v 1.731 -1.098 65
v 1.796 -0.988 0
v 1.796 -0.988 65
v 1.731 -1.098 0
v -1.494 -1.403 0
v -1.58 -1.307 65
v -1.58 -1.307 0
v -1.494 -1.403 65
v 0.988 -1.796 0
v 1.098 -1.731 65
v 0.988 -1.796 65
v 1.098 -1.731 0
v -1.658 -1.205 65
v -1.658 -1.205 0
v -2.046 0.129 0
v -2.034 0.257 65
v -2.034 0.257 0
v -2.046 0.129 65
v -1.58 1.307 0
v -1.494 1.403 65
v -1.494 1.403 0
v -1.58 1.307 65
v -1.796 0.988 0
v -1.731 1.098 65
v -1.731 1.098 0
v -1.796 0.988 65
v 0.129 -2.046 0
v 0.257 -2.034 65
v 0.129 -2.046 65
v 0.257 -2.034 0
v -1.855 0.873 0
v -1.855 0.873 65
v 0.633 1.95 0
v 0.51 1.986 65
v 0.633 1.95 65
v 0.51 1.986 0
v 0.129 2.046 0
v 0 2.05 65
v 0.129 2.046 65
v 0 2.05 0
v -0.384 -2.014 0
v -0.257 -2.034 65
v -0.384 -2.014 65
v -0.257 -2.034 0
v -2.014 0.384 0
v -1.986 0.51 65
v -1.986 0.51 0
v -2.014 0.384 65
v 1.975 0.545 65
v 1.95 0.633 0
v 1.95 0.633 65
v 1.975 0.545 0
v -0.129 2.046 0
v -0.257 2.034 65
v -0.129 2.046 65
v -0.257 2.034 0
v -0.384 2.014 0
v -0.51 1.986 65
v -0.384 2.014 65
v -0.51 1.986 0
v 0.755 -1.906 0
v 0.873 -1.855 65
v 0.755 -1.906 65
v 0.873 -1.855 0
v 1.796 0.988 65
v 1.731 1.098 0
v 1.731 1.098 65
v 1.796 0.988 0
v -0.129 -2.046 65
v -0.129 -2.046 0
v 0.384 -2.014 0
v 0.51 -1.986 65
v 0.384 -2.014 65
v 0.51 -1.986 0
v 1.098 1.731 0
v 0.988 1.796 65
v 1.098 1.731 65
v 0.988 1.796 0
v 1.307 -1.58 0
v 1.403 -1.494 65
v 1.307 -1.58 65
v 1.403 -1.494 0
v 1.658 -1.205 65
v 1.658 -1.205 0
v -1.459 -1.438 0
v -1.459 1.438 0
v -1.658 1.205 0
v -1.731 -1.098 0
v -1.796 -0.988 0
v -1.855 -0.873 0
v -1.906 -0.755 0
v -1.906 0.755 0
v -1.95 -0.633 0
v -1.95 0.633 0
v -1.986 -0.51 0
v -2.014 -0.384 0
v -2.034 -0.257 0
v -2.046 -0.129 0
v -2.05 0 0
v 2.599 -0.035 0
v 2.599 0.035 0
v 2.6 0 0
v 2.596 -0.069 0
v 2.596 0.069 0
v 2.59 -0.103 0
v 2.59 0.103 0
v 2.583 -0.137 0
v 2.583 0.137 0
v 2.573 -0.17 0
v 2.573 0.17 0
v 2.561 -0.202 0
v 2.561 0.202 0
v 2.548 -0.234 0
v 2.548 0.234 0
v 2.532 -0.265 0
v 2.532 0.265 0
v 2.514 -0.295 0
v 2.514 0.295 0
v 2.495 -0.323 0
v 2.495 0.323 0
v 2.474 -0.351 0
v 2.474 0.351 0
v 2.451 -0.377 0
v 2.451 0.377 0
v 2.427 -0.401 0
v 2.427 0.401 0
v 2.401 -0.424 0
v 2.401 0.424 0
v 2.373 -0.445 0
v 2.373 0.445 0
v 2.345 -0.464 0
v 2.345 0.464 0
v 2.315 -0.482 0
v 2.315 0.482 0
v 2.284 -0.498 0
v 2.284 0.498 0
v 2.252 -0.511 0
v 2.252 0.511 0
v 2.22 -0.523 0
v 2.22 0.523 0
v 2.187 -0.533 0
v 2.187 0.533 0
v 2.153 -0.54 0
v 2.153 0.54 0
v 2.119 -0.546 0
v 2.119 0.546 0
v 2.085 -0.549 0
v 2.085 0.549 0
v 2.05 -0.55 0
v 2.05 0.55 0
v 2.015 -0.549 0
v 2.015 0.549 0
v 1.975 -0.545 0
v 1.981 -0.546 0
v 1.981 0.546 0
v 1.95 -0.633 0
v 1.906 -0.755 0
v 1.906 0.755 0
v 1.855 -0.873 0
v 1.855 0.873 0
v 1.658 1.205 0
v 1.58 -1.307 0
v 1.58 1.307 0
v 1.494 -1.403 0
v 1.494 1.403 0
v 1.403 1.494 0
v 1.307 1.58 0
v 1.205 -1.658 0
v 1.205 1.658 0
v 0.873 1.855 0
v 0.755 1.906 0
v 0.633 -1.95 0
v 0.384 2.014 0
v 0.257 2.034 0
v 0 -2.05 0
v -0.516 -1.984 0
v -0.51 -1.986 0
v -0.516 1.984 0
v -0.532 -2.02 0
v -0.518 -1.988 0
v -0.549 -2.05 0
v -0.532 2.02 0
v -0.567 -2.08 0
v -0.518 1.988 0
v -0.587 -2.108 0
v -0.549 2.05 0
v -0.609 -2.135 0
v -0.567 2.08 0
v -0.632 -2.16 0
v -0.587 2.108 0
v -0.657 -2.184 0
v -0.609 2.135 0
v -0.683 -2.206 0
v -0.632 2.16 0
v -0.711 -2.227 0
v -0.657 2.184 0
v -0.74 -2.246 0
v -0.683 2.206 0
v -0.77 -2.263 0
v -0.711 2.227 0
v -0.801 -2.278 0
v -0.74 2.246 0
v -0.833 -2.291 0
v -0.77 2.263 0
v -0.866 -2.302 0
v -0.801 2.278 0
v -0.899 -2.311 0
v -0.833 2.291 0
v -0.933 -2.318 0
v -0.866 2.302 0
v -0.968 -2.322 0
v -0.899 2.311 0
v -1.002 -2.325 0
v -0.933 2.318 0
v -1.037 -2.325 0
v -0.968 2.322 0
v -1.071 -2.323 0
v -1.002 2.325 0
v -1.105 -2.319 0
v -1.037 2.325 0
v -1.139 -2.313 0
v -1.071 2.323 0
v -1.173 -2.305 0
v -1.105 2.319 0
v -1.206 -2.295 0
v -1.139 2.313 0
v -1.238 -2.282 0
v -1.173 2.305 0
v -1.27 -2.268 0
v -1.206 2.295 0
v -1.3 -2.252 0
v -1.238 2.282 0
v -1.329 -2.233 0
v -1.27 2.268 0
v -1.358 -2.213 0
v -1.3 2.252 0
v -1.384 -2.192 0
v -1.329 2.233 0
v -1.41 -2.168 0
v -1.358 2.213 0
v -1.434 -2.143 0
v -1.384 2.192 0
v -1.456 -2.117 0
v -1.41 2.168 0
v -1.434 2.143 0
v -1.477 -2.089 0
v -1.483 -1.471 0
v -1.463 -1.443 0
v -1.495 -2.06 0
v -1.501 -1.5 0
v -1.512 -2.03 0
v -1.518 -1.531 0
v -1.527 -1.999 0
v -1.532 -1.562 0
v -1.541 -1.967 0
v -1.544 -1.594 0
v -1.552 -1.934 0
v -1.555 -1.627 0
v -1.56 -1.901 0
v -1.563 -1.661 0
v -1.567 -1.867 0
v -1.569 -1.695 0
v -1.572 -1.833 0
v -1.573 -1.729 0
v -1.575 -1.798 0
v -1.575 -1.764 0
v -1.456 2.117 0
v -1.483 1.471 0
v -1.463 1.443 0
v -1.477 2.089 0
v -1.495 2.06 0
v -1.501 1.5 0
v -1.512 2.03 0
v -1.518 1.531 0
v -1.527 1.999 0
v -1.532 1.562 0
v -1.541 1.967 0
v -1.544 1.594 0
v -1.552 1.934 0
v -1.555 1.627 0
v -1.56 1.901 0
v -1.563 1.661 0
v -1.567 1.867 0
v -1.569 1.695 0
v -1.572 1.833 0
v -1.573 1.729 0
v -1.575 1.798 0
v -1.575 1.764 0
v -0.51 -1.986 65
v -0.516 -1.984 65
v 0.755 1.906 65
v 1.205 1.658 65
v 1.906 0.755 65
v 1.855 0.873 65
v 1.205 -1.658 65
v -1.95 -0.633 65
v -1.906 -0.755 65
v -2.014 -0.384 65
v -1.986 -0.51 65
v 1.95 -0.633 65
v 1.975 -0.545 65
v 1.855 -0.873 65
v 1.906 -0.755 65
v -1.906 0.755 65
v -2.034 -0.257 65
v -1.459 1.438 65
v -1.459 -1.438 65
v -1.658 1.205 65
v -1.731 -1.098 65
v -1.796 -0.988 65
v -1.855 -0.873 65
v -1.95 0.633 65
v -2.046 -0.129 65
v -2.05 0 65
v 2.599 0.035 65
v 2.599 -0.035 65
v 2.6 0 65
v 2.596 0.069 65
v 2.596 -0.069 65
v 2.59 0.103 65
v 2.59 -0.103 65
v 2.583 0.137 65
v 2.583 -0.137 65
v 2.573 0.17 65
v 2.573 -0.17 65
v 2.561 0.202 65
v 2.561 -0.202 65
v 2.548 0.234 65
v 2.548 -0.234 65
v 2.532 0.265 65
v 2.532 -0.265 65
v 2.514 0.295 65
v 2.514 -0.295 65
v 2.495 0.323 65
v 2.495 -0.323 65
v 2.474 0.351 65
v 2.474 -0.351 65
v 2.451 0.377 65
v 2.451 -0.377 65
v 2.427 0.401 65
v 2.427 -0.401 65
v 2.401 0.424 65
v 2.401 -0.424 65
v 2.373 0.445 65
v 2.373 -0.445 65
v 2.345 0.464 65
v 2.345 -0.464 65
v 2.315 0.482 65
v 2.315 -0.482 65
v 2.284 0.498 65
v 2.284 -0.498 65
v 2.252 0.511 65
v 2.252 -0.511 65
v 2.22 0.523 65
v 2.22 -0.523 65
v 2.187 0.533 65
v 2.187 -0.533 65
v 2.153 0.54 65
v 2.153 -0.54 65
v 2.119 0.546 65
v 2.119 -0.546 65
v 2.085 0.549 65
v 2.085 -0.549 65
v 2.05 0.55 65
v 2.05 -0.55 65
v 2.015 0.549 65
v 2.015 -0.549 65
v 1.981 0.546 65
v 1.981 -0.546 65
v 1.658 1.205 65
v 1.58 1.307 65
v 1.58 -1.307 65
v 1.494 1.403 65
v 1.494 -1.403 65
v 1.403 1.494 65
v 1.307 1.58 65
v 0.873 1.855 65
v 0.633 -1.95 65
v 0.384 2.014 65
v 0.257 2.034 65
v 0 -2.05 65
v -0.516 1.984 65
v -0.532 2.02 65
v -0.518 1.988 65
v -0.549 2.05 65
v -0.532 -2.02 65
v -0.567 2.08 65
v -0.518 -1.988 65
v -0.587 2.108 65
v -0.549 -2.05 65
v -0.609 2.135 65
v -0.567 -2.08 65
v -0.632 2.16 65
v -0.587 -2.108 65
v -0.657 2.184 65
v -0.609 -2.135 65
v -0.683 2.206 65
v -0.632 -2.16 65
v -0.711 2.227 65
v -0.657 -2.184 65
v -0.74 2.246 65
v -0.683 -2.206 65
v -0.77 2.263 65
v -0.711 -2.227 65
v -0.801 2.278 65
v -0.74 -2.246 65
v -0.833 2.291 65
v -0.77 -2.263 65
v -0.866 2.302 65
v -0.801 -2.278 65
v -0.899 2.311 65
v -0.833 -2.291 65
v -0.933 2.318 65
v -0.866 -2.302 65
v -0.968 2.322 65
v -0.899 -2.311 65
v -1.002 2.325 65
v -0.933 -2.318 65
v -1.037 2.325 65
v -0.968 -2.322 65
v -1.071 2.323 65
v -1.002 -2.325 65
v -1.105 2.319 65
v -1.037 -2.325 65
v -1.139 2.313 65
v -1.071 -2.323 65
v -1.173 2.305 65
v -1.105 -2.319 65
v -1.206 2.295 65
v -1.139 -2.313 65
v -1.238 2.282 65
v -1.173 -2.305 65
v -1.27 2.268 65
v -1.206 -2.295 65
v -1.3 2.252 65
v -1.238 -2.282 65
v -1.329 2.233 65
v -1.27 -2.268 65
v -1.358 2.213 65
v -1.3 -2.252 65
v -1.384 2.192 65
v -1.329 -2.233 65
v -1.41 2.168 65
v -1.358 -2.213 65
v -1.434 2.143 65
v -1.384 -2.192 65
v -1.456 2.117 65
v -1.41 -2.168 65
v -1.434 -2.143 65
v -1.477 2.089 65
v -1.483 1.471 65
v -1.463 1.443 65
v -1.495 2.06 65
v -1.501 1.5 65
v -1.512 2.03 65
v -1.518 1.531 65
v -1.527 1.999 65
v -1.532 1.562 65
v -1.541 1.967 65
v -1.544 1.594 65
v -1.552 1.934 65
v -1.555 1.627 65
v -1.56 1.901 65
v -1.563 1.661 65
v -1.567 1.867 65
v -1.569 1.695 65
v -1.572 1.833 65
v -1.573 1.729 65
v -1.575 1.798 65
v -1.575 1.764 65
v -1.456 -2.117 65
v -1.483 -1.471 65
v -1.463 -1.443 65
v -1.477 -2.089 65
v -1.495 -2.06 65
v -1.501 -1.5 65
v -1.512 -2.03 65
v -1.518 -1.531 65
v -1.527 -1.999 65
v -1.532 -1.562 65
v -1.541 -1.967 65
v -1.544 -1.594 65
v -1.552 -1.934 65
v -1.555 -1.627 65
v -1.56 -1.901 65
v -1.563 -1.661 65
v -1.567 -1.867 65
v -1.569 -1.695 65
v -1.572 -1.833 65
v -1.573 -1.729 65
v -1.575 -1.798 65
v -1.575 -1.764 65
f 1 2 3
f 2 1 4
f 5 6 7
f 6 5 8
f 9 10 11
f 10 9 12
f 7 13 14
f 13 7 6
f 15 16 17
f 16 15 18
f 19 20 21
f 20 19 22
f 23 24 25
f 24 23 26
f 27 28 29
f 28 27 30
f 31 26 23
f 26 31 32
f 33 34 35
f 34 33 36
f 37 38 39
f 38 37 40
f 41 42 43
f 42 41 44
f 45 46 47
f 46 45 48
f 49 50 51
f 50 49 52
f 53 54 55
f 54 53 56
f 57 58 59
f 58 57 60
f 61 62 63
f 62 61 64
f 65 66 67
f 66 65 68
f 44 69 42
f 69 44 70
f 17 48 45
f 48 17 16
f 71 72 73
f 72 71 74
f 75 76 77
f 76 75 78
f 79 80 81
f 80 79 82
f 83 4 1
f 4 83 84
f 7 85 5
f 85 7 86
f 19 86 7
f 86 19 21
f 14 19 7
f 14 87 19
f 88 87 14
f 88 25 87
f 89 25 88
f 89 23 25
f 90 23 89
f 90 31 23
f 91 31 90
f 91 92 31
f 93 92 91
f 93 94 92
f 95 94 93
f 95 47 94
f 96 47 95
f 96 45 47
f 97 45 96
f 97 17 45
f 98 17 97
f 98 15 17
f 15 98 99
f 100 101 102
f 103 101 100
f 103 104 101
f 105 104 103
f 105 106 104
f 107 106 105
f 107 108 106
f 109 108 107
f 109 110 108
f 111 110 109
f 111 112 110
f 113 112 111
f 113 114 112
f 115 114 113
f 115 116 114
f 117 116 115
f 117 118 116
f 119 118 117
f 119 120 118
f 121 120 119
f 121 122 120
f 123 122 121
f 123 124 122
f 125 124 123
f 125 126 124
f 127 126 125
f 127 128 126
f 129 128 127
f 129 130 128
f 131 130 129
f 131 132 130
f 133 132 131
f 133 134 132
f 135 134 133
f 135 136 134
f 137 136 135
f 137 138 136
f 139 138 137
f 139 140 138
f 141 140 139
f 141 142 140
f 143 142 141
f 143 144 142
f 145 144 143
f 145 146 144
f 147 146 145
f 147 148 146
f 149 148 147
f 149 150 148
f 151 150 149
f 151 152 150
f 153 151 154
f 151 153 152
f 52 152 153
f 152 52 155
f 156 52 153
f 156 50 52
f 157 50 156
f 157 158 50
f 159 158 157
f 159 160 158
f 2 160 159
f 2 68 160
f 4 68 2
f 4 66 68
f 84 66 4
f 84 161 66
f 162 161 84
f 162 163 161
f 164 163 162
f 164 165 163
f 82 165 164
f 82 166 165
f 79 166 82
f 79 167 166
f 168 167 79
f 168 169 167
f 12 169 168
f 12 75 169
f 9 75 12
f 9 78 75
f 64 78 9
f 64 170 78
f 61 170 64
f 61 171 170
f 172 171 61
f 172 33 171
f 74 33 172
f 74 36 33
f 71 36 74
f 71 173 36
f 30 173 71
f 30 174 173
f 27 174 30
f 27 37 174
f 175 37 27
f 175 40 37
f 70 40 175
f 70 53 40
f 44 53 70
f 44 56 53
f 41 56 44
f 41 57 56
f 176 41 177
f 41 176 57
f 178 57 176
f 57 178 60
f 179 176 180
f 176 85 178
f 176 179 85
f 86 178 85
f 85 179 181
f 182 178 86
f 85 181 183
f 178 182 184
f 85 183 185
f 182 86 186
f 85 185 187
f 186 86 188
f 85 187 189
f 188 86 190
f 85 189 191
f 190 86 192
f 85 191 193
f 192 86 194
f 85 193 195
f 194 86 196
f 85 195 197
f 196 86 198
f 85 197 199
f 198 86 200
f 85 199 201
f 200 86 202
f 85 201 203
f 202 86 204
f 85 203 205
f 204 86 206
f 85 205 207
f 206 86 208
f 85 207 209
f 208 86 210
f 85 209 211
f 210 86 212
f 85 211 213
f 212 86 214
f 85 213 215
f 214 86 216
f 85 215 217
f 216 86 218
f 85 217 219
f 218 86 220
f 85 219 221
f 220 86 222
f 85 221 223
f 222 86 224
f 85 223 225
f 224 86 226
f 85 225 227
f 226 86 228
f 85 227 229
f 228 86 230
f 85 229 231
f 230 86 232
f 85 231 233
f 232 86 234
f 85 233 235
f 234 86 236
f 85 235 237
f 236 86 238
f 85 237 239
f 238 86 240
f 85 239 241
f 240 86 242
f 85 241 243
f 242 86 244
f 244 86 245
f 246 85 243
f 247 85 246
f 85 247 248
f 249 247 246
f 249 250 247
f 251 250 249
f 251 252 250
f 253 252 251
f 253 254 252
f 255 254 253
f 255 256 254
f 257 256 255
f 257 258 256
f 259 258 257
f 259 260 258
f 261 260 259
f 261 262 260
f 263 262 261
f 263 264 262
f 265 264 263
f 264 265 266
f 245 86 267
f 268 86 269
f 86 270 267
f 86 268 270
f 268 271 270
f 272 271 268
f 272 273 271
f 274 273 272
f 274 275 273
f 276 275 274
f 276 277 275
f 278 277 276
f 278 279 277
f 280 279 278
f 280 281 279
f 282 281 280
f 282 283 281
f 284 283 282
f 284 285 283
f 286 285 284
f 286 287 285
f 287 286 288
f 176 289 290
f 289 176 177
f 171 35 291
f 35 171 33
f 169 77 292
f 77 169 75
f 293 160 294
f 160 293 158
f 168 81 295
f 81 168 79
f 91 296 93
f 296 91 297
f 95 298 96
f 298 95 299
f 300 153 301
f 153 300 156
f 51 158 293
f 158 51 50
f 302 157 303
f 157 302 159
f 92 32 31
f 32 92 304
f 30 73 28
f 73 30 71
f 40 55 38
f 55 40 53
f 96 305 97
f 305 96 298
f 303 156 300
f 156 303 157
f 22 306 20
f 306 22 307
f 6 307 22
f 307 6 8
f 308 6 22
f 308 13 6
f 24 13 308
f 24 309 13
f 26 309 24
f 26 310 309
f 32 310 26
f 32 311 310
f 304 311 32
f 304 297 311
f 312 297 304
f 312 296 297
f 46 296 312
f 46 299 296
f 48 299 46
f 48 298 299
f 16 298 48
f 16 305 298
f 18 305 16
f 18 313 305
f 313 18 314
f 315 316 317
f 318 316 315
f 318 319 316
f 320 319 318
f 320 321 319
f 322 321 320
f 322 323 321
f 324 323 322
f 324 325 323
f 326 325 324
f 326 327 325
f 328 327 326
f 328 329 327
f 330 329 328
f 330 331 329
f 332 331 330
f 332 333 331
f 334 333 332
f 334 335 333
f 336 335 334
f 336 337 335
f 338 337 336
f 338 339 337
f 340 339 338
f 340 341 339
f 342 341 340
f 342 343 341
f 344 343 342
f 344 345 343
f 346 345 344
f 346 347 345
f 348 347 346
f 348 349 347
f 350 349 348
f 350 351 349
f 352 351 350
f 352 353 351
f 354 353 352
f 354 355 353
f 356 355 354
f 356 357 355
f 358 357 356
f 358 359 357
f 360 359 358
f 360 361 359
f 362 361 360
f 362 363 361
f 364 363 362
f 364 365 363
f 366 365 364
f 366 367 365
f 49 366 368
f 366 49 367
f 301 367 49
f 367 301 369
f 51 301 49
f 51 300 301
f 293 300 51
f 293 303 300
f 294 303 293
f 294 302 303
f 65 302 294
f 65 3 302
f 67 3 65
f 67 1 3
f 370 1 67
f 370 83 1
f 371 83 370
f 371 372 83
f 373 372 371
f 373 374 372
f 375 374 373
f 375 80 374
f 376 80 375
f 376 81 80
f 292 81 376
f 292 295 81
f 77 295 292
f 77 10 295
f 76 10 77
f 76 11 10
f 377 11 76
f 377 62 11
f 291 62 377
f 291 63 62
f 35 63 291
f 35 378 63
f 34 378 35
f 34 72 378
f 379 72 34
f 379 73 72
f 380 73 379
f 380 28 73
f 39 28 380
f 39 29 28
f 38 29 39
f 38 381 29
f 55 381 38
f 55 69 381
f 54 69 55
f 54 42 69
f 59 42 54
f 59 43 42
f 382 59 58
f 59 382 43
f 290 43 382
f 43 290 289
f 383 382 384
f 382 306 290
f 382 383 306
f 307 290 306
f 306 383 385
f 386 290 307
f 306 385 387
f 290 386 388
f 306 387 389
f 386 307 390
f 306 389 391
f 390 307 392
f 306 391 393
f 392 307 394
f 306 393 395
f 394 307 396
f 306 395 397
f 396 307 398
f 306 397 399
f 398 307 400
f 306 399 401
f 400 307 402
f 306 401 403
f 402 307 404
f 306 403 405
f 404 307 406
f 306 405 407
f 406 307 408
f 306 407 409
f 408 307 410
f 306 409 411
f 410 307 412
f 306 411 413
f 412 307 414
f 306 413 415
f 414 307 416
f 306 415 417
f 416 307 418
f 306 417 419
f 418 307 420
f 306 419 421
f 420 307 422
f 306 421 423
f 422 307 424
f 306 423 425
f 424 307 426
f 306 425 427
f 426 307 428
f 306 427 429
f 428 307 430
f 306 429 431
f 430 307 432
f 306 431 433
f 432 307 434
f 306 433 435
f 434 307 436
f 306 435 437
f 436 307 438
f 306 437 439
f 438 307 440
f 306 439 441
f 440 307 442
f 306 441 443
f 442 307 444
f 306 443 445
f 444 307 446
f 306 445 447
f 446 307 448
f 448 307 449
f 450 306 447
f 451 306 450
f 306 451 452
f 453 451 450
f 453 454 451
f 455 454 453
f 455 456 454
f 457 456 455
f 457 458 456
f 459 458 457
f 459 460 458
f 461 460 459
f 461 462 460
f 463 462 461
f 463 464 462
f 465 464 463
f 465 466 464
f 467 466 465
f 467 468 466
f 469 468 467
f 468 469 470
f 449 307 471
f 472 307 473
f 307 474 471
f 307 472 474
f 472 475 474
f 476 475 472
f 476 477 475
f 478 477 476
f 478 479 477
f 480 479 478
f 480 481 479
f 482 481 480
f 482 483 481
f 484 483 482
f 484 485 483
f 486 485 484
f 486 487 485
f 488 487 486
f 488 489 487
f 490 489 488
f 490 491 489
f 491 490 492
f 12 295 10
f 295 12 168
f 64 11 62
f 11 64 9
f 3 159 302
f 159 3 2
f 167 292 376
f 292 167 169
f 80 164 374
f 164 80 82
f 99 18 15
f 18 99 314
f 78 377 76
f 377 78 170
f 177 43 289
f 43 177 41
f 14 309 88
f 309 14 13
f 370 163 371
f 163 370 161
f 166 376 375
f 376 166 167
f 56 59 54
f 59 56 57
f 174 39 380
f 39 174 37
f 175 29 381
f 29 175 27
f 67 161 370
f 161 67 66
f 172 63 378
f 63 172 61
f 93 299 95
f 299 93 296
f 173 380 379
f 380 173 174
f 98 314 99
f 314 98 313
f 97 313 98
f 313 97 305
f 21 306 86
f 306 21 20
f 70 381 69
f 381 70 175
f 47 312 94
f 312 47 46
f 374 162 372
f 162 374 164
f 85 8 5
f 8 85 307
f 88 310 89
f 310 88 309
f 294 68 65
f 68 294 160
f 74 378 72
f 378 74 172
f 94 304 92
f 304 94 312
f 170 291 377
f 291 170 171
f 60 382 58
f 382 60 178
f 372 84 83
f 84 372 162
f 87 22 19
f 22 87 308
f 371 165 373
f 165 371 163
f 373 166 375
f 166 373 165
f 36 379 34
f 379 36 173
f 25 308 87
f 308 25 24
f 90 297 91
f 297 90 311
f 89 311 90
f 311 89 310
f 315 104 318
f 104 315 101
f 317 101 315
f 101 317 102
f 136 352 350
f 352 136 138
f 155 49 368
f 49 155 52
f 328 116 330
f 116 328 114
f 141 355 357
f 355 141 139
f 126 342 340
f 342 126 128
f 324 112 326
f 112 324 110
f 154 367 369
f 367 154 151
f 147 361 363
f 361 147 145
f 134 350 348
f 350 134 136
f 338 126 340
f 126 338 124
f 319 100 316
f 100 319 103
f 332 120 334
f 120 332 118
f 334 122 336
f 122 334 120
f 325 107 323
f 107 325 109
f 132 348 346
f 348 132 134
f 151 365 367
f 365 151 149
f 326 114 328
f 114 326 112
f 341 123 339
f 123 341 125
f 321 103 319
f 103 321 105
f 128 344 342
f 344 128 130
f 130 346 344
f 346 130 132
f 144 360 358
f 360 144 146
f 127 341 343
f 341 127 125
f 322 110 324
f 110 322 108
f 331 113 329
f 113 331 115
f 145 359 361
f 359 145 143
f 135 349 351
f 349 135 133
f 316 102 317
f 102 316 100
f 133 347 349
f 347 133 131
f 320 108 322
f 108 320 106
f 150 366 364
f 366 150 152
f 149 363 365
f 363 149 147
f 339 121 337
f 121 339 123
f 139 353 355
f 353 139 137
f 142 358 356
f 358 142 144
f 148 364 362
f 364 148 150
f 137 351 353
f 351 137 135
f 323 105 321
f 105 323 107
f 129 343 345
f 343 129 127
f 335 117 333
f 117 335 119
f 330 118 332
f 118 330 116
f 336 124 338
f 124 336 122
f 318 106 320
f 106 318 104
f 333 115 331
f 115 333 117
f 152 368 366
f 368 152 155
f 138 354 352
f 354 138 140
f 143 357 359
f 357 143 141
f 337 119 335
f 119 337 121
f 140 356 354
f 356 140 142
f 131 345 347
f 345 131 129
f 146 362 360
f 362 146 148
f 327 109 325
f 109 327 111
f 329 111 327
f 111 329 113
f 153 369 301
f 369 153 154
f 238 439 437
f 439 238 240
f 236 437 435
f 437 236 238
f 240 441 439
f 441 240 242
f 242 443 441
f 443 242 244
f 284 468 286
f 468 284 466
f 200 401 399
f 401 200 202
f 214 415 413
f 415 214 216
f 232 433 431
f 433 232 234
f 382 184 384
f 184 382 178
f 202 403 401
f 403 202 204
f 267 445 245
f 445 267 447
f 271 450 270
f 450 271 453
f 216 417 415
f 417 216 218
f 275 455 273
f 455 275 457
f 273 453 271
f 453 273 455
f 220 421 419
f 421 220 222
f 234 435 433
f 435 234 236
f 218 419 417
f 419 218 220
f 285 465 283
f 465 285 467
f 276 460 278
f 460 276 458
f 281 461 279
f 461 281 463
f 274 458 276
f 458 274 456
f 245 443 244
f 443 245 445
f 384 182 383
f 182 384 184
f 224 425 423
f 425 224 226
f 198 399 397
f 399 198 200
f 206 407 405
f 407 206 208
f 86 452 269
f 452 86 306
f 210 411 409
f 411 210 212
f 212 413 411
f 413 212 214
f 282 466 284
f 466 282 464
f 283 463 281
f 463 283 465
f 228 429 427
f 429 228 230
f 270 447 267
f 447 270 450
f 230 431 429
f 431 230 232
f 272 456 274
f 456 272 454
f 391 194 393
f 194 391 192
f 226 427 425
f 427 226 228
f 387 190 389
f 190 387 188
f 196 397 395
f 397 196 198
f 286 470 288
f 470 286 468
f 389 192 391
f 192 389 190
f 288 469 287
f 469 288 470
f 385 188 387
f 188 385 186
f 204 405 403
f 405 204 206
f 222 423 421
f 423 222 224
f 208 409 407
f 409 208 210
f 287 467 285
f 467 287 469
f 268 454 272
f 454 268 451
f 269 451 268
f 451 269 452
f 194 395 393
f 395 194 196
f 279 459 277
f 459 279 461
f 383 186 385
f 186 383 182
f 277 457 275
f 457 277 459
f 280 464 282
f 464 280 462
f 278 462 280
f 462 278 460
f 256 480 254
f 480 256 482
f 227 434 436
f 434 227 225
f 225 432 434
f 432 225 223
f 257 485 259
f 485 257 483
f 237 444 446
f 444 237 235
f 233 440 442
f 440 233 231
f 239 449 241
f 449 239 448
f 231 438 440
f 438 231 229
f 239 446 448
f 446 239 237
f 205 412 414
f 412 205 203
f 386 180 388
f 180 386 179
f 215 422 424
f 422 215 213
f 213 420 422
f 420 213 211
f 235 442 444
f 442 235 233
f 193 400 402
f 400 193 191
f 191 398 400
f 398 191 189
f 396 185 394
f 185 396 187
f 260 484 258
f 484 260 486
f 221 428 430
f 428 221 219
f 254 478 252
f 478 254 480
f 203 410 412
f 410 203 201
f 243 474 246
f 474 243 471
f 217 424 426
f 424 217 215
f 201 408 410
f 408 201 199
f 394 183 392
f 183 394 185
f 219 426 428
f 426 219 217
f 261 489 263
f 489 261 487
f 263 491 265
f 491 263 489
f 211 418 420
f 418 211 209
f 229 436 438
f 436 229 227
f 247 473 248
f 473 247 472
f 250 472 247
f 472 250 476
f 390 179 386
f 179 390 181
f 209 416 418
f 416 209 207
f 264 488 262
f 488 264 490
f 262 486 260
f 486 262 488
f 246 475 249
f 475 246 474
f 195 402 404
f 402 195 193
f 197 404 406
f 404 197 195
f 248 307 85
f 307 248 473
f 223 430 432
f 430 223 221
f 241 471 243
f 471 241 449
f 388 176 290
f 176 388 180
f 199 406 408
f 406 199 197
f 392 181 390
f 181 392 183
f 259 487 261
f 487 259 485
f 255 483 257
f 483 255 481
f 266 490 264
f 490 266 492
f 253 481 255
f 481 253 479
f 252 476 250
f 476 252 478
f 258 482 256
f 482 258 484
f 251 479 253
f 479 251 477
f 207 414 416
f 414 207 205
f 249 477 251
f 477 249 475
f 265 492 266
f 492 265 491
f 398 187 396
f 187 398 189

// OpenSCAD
// PARAMETRES

$fn = 100;

marge = 0.2; // écart en mm du rayon des pièces pour qu'elles puissent s'imbriquer entre elles
// ajout des marges sur les trous pour l'instant

// MODULE
rayon_module = 5.75;
hauteur = 50+15;
rayon_chambre = 0.75;
rayon_canule = 0.75 - marge; // for pressure pipes
rayon_lumen = 2.25 - marge;
dec = 6; // longueur d'un coté du triangle équilatéral
//dec_y = rayon_module/6;
e = 3; //écartement entre deux paires de trous



//rayon_canule = rayon_canule - 0.2; // Finalement elles seront déduit de la poutre centrale
//rayon_lumen = rayon_lumen - 0.2;

cylinder(hauteur,rayon_lumen,rayon_lumen);
translate([rayon_lumen,0,0])cylinder(hauteur,rayon_canule,rayon_canule);
rotate([0,0,120])translate([rayon_lumen,0,0])cylinder(hauteur,rayon_canule,rayon_canule);
rotate([0,0,240])translate([rayon_lumen,0,0])cylinder(hauteur,rayon_canule,rayon_canule);
